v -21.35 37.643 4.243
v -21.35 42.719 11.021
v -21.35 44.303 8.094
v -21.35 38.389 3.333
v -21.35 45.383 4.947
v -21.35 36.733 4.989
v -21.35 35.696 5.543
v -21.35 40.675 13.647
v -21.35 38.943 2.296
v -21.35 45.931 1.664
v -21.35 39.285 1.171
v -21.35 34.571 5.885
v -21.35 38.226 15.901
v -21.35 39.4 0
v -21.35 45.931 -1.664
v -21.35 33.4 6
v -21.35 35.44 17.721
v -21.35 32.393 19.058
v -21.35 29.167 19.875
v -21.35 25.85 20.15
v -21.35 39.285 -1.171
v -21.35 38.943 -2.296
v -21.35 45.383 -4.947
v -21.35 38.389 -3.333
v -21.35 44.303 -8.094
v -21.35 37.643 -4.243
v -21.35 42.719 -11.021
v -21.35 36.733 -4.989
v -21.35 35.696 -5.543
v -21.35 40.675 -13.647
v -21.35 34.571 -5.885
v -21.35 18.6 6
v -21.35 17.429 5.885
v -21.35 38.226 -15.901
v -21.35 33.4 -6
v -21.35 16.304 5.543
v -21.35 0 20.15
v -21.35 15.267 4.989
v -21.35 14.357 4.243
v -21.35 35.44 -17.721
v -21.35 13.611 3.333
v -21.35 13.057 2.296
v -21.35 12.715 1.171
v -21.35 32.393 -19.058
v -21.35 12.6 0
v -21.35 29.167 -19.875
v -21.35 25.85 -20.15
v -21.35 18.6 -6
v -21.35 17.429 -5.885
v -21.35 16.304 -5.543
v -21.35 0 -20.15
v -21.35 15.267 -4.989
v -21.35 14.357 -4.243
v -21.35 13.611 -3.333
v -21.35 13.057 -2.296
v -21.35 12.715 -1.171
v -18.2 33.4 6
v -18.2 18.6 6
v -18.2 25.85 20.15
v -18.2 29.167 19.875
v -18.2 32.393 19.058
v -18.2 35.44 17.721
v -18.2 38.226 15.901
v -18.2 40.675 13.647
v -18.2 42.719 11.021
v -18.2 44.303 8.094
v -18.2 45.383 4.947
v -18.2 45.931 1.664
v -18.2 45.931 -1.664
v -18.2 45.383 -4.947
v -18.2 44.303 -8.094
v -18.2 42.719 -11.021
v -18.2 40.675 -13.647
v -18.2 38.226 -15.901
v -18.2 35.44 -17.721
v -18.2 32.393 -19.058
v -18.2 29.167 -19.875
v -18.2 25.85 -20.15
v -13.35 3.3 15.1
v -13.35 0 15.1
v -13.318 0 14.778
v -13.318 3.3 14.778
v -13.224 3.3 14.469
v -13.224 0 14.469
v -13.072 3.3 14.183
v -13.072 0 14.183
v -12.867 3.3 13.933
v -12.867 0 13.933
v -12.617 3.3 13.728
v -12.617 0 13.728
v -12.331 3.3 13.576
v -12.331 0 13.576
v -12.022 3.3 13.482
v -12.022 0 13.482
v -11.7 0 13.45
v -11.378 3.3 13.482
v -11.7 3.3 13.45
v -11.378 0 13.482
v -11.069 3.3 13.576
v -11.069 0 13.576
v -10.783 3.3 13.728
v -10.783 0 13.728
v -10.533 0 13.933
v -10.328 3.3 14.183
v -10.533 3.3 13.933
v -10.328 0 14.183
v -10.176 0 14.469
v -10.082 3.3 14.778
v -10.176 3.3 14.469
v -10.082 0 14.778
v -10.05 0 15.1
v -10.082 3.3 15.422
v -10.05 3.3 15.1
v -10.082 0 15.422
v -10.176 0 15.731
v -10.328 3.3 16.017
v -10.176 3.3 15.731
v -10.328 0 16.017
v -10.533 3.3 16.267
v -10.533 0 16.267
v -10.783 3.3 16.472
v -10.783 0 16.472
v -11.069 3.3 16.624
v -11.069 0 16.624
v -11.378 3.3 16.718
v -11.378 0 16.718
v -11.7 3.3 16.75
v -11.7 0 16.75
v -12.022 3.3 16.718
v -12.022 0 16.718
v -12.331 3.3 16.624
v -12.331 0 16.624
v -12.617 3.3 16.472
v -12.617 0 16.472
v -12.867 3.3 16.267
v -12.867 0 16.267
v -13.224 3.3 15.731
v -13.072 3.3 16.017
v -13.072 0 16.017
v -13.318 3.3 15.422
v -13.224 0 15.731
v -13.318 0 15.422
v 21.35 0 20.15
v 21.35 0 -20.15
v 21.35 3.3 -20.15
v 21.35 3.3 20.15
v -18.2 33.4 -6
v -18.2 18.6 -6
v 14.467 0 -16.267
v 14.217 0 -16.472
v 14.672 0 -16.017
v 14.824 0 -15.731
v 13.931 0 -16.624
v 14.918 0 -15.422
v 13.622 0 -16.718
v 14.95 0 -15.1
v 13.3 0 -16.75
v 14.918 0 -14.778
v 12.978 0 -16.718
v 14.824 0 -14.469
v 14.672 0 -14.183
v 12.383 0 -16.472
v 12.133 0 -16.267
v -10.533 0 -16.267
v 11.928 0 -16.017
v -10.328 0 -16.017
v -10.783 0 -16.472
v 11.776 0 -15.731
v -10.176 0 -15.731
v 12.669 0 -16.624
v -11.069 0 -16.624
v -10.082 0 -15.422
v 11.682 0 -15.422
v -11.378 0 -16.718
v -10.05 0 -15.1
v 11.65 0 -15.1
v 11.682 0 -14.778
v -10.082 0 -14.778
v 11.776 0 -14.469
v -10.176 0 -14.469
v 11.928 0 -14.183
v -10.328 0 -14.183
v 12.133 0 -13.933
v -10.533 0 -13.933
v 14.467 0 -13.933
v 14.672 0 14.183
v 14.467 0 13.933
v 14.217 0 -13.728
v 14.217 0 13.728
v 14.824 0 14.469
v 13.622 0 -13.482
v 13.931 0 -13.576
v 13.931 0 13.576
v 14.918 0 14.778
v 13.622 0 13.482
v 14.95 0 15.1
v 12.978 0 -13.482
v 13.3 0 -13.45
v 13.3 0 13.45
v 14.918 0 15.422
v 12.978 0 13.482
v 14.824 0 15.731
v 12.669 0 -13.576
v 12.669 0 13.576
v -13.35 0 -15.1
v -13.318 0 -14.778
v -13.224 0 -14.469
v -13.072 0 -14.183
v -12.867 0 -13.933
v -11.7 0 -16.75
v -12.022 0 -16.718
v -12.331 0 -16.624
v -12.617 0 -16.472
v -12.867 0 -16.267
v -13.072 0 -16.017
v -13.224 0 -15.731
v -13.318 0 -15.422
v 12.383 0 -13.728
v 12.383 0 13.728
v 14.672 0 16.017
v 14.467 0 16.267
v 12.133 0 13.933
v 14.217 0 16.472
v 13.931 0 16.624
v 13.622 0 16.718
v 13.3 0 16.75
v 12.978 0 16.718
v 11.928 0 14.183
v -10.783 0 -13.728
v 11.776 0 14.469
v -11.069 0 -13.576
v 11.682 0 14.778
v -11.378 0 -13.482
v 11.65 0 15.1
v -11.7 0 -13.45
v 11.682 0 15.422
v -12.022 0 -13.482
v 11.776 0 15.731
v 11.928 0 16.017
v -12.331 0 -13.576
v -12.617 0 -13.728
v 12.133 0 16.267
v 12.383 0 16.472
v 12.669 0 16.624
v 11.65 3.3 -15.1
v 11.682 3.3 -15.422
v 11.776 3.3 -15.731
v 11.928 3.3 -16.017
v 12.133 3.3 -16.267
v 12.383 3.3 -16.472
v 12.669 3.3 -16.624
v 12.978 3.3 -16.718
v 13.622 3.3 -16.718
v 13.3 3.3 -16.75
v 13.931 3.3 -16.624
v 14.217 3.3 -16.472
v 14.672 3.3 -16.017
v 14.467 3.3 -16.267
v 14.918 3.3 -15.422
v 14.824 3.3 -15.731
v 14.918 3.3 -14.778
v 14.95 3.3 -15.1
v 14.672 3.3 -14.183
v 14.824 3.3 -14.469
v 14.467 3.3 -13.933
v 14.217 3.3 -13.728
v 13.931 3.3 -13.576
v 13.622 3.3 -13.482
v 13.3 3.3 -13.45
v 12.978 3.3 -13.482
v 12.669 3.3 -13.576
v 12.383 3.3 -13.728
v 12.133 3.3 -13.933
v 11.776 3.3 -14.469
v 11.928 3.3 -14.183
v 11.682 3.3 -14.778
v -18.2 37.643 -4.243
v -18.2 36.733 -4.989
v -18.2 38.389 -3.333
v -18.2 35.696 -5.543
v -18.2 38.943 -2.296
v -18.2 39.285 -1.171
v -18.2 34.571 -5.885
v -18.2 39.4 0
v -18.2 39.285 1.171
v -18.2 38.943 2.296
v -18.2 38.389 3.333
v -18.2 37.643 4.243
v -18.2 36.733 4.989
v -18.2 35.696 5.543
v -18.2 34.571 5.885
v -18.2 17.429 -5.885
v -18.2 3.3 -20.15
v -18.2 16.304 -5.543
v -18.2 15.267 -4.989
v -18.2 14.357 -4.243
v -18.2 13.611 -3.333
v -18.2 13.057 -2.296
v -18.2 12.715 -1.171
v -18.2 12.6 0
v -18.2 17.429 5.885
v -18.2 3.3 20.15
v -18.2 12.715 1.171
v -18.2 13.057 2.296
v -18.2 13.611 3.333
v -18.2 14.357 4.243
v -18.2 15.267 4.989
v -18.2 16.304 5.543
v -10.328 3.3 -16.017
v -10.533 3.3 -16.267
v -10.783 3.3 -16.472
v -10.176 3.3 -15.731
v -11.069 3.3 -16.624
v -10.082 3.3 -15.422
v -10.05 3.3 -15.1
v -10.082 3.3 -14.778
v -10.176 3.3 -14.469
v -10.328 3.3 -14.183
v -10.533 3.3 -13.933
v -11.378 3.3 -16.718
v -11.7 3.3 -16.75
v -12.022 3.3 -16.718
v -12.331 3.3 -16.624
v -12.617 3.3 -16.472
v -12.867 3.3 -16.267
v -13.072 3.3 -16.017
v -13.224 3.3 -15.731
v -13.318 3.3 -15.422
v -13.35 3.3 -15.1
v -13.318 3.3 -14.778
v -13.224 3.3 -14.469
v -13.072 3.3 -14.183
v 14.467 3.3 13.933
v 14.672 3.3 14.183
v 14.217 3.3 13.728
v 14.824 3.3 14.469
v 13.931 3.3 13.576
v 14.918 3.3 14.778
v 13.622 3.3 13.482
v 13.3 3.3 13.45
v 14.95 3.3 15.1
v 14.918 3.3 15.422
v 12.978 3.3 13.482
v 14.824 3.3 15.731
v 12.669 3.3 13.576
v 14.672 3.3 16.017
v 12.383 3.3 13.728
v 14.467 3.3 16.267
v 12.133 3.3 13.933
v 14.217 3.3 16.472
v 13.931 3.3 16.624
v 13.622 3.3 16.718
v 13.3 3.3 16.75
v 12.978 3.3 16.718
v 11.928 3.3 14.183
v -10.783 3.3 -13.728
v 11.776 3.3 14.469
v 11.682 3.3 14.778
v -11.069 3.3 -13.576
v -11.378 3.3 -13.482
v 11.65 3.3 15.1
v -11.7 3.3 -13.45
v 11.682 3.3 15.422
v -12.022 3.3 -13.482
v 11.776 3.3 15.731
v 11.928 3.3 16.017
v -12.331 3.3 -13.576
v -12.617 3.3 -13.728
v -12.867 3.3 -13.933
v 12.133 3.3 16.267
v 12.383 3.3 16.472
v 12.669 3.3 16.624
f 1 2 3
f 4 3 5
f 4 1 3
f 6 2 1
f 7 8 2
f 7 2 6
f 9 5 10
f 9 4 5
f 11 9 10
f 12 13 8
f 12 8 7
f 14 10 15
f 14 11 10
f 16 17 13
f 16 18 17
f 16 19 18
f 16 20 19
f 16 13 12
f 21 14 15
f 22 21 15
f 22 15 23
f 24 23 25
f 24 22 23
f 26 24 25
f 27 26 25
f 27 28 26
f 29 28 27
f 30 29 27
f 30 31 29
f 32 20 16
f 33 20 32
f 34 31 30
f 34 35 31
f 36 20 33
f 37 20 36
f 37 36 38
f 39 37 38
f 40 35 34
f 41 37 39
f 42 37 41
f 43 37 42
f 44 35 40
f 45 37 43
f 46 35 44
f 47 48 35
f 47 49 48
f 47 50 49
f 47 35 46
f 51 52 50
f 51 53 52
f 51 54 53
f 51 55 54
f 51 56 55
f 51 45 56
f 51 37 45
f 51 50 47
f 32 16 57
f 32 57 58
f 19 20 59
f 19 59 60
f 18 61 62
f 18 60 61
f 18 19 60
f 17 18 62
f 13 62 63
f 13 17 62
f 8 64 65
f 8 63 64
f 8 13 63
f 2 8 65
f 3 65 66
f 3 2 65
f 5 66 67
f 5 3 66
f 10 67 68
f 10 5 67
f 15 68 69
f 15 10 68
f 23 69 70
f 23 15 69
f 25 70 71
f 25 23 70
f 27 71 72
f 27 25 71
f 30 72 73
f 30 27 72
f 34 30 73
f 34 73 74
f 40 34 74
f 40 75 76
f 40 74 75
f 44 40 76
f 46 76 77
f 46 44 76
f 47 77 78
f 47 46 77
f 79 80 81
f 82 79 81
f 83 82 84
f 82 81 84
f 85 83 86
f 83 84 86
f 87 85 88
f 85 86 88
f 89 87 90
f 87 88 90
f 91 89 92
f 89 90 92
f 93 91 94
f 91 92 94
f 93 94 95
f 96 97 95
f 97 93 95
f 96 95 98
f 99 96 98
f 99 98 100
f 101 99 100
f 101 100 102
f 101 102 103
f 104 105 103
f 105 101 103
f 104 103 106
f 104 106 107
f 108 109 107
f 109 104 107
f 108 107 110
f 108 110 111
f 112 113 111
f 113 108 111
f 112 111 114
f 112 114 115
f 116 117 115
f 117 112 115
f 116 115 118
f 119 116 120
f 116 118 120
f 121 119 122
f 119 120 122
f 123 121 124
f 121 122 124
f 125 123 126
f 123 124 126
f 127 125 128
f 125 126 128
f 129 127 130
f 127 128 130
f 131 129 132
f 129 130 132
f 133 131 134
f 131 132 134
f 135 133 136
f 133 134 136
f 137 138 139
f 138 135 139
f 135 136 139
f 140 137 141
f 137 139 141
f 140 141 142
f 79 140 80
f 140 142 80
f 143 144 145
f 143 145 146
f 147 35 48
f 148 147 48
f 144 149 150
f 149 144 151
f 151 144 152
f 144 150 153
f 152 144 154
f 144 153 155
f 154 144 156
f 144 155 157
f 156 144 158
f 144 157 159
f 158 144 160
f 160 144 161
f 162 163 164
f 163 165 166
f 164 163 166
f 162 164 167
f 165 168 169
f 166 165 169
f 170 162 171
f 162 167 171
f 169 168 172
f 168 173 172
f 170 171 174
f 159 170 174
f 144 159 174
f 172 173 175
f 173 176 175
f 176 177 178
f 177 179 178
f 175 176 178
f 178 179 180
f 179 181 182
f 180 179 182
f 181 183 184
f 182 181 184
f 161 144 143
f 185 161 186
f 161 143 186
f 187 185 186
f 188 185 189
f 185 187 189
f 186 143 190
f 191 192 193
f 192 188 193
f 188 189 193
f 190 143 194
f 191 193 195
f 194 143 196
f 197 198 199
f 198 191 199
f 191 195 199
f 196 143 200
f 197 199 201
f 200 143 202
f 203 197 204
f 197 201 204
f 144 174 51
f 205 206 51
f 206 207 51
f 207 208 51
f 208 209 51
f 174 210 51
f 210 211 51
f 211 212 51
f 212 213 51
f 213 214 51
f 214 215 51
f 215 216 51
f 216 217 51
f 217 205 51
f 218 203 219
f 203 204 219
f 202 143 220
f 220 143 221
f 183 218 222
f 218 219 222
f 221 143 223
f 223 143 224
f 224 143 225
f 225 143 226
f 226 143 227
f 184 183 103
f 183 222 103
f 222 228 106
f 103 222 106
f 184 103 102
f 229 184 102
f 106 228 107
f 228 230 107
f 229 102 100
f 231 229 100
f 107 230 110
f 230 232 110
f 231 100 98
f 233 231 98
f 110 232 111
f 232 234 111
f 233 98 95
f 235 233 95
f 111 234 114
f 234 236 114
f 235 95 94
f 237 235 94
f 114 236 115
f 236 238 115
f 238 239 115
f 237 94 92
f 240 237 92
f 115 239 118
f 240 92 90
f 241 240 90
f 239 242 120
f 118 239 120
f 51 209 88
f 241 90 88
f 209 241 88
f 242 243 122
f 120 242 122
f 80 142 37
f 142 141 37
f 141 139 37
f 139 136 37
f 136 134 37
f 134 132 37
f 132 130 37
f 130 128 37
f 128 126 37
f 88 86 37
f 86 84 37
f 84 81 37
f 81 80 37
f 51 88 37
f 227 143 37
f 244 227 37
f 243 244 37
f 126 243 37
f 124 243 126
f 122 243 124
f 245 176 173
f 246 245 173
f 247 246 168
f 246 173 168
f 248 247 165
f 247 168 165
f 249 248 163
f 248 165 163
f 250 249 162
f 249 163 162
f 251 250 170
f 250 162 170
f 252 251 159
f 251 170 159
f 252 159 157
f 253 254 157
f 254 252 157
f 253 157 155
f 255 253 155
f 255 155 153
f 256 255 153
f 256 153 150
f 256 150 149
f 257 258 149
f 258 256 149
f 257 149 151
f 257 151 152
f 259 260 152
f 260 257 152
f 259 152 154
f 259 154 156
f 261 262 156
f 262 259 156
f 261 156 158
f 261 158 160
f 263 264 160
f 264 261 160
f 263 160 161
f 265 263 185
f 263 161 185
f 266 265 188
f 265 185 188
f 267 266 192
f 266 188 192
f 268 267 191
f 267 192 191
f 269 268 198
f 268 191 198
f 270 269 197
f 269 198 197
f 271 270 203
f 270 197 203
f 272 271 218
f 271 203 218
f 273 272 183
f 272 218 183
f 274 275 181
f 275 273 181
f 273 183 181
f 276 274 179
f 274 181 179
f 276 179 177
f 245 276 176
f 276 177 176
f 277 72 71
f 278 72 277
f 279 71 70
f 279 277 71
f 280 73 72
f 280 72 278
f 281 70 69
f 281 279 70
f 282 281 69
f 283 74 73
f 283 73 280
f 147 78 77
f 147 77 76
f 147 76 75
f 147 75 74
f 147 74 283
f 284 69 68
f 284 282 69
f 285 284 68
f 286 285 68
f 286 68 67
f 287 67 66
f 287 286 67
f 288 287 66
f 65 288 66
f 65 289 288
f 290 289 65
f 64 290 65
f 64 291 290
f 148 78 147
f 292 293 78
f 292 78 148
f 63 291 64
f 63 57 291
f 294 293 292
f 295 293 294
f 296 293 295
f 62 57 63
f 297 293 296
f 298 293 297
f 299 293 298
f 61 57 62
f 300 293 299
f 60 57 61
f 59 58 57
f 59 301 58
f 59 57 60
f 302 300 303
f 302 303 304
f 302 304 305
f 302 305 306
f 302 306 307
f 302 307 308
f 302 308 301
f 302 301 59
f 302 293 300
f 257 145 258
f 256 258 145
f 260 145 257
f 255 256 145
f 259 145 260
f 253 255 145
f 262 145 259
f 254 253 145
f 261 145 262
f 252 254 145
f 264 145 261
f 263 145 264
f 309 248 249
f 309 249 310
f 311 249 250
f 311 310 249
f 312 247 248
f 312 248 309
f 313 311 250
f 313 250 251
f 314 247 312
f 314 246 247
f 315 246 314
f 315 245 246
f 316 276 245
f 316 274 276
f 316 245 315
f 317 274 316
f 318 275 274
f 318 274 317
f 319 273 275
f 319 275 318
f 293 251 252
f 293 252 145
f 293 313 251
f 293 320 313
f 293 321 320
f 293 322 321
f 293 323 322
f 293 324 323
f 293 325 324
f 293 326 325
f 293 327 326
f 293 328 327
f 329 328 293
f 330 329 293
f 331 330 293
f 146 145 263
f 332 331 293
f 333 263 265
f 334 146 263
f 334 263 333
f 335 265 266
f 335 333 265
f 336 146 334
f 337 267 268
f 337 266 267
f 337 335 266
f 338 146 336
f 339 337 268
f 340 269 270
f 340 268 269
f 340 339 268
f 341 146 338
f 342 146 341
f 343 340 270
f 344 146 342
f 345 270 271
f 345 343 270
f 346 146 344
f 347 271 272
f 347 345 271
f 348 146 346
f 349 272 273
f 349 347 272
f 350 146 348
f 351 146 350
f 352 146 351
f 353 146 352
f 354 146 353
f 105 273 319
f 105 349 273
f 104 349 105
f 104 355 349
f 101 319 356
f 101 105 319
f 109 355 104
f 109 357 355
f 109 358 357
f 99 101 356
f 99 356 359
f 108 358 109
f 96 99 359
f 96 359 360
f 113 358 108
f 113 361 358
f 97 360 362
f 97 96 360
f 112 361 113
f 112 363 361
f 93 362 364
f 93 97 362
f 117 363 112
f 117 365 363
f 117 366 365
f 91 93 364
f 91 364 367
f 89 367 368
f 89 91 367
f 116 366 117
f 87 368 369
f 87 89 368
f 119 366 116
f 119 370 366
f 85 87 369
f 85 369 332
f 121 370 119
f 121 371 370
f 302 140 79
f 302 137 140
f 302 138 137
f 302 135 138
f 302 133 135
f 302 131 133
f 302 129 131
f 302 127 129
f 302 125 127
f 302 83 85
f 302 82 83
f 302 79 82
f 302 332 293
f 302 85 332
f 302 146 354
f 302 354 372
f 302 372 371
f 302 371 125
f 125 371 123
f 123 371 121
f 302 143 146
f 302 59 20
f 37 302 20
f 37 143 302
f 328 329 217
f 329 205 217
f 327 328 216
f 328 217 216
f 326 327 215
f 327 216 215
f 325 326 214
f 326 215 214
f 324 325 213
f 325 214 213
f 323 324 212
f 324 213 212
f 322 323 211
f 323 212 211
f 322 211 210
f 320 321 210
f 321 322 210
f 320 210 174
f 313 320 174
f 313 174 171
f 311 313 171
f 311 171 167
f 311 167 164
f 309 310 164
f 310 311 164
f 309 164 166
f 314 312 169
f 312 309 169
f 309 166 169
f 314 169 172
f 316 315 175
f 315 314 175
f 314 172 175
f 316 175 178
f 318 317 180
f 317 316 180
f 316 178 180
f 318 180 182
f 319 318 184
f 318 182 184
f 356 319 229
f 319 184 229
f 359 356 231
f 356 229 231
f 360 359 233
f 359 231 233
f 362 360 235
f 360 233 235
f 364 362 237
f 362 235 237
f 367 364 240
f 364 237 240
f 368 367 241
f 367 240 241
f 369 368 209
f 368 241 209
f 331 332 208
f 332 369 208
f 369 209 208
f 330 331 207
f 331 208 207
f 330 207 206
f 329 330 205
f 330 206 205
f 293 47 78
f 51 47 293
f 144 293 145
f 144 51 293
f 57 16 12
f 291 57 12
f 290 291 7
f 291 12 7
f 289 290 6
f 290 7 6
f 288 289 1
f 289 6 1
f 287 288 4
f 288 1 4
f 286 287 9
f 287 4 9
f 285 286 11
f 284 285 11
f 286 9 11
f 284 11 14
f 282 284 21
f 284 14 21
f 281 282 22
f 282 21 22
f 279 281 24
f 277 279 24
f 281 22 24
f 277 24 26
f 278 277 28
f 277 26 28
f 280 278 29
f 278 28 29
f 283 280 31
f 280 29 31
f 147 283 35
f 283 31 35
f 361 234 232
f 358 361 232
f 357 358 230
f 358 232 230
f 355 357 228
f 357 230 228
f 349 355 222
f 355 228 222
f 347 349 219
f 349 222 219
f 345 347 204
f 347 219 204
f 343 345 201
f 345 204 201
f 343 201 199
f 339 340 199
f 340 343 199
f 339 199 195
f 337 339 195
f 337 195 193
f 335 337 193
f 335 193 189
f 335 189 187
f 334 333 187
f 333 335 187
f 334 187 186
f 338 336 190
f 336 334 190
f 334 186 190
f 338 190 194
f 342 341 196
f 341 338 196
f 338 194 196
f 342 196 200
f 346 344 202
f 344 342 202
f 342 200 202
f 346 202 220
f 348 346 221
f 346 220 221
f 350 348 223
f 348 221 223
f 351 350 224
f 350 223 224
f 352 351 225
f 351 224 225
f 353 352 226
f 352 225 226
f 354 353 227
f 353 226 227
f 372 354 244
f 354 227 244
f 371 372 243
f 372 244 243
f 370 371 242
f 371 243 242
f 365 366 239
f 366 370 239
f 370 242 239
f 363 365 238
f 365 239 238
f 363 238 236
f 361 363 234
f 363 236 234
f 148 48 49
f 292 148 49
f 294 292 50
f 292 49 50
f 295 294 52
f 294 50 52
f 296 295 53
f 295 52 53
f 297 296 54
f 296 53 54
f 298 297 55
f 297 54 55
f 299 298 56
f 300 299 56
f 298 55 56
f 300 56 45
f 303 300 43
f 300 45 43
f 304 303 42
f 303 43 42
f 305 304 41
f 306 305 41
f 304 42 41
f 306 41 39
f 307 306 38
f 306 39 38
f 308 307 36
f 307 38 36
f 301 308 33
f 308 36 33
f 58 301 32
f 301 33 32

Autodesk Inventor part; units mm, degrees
ref_plane "YZ Plane" through (0, 0, 0) normal (1, 0, 0) x (0, 1, 0)
ref_plane "XZ Plane" through (0, 0, 0) normal (0, 1, 0) x (-1, 0, 0)
ref_plane "XY Plane" through (0, 0, 0) normal (0, 0, 1) x (1, 0, 0)
sketch "Sketch1" plane through (0, 0, 0) normal (0, 1, 0) x (-1, 0, 0)
  line L0 (21.35, -20.15) -> (-21.35, -20.15)
  line L1 (-21.35, -20.15) -> (-21.35, 20.15)
  line L2 (-21.35, 20.15) -> (21.35, 20.15)
  line L3 (21.35, 20.15) -> (21.35, -20.15)
  circle A0 centre (-13.3, -15.1) radius 1.65
  circle A1 centre (11.7, -15.1) radius 1.65
  circle A2 centre (-13.3, 15.1) radius 1.65
  circle A3 centre (11.7, 15.1) radius 1.65
  point P0 (0, 0)
  point P1 (0, -20.15)
  point P2 (21.35, 0)
  dimension "d0" = 40.3
  dimension "d1" = 42.7
  dimension "d2" = 6.4
  dimension "d3" = 3.3
  dimension "d4" = 3.4
  dimension "d7" = 25
  dimension "d10" = 30.2
extrude "Extrusion1" add sketch "Sketch1" along normal blind 3.3
sketch "Sketch2" plane through (0, 3.3, 0) normal (0, 1, 0) x (1, 0, 0)
  line L0 (-21.35, 20.15) -> (-21.35, -20.15) projected
  line L1 (-21.35, -20.15) -> (21.35, -20.15) projected
  line L2 (-21.35, 20.15) -> (-18.2, 20.15)
  line L3 (-18.2, 20.15) -> (-18.2, -20.15)
  line L4 (-18.2, -20.15) -> (-21.35, -20.15)
  line L5 (-21.35, -20.15) -> (-21.35, 20.15)
  point P0 (0, 0)
  dimension "d15" = 3.15
extrude "Extrusion2" add sketch "Sketch2" along normal blind 42.7
sketch "Sketch3" plane through (-21.35, 0, -20.15) normal (-1, 0, 0) x (0, 0, 1)
  line L0 (40.3, 3.3) -> (40.3, 46) projected
  line L1 (0, 3.3) -> (0, 46) projected
  arc A0 (40.3, 25.85) -> (0, 25.85) centre (20.15, 25.85) ccw
  line L2 (0, 46) -> (40.3, 46) projected
  point P0 (20.15, 0)
  point P1 (20.15, 46)
  point P2 (0, 31.0213)
  point P3 (40.3, 31.0213)
extrude "Extrusion3" cut sketch "Sketch3" against normal through all
sketch "Sketch4" plane through (-21.35, 0, -20.15) normal (-1, 0, 0) x (0, 0, 1)
  arc A0 (26.15, 33.4) -> (14.15, 33.4) centre (20.15, 33.4) ccw
  line L0 (14.15, 33.4) -> (14.15, 18.6)
  line L1 (26.15, 33.4) -> (26.15, 18.6)
  arc A1 (14.15, 18.6) -> (26.15, 18.6) centre (20.15, 18.6) ccw
  arc A2 (40.3, 25.85) -> (0, 25.85) centre (20.15, 25.85) ccw projected
  point P0 (20.15, 0)
  point P1 (20.15, 46)
  point P2 (20.15, 39.4)
  point P3 (20.15, 46)
  point P4 (20.15, 12.6)
  dimension "d20" = 6.6
  dimension "d21" = 6
  dimension "d22" = 26.8
extrude "Extrusion4" cut sketch "Sketch4" against normal through all
properties part number "Drive Motor Stand"
